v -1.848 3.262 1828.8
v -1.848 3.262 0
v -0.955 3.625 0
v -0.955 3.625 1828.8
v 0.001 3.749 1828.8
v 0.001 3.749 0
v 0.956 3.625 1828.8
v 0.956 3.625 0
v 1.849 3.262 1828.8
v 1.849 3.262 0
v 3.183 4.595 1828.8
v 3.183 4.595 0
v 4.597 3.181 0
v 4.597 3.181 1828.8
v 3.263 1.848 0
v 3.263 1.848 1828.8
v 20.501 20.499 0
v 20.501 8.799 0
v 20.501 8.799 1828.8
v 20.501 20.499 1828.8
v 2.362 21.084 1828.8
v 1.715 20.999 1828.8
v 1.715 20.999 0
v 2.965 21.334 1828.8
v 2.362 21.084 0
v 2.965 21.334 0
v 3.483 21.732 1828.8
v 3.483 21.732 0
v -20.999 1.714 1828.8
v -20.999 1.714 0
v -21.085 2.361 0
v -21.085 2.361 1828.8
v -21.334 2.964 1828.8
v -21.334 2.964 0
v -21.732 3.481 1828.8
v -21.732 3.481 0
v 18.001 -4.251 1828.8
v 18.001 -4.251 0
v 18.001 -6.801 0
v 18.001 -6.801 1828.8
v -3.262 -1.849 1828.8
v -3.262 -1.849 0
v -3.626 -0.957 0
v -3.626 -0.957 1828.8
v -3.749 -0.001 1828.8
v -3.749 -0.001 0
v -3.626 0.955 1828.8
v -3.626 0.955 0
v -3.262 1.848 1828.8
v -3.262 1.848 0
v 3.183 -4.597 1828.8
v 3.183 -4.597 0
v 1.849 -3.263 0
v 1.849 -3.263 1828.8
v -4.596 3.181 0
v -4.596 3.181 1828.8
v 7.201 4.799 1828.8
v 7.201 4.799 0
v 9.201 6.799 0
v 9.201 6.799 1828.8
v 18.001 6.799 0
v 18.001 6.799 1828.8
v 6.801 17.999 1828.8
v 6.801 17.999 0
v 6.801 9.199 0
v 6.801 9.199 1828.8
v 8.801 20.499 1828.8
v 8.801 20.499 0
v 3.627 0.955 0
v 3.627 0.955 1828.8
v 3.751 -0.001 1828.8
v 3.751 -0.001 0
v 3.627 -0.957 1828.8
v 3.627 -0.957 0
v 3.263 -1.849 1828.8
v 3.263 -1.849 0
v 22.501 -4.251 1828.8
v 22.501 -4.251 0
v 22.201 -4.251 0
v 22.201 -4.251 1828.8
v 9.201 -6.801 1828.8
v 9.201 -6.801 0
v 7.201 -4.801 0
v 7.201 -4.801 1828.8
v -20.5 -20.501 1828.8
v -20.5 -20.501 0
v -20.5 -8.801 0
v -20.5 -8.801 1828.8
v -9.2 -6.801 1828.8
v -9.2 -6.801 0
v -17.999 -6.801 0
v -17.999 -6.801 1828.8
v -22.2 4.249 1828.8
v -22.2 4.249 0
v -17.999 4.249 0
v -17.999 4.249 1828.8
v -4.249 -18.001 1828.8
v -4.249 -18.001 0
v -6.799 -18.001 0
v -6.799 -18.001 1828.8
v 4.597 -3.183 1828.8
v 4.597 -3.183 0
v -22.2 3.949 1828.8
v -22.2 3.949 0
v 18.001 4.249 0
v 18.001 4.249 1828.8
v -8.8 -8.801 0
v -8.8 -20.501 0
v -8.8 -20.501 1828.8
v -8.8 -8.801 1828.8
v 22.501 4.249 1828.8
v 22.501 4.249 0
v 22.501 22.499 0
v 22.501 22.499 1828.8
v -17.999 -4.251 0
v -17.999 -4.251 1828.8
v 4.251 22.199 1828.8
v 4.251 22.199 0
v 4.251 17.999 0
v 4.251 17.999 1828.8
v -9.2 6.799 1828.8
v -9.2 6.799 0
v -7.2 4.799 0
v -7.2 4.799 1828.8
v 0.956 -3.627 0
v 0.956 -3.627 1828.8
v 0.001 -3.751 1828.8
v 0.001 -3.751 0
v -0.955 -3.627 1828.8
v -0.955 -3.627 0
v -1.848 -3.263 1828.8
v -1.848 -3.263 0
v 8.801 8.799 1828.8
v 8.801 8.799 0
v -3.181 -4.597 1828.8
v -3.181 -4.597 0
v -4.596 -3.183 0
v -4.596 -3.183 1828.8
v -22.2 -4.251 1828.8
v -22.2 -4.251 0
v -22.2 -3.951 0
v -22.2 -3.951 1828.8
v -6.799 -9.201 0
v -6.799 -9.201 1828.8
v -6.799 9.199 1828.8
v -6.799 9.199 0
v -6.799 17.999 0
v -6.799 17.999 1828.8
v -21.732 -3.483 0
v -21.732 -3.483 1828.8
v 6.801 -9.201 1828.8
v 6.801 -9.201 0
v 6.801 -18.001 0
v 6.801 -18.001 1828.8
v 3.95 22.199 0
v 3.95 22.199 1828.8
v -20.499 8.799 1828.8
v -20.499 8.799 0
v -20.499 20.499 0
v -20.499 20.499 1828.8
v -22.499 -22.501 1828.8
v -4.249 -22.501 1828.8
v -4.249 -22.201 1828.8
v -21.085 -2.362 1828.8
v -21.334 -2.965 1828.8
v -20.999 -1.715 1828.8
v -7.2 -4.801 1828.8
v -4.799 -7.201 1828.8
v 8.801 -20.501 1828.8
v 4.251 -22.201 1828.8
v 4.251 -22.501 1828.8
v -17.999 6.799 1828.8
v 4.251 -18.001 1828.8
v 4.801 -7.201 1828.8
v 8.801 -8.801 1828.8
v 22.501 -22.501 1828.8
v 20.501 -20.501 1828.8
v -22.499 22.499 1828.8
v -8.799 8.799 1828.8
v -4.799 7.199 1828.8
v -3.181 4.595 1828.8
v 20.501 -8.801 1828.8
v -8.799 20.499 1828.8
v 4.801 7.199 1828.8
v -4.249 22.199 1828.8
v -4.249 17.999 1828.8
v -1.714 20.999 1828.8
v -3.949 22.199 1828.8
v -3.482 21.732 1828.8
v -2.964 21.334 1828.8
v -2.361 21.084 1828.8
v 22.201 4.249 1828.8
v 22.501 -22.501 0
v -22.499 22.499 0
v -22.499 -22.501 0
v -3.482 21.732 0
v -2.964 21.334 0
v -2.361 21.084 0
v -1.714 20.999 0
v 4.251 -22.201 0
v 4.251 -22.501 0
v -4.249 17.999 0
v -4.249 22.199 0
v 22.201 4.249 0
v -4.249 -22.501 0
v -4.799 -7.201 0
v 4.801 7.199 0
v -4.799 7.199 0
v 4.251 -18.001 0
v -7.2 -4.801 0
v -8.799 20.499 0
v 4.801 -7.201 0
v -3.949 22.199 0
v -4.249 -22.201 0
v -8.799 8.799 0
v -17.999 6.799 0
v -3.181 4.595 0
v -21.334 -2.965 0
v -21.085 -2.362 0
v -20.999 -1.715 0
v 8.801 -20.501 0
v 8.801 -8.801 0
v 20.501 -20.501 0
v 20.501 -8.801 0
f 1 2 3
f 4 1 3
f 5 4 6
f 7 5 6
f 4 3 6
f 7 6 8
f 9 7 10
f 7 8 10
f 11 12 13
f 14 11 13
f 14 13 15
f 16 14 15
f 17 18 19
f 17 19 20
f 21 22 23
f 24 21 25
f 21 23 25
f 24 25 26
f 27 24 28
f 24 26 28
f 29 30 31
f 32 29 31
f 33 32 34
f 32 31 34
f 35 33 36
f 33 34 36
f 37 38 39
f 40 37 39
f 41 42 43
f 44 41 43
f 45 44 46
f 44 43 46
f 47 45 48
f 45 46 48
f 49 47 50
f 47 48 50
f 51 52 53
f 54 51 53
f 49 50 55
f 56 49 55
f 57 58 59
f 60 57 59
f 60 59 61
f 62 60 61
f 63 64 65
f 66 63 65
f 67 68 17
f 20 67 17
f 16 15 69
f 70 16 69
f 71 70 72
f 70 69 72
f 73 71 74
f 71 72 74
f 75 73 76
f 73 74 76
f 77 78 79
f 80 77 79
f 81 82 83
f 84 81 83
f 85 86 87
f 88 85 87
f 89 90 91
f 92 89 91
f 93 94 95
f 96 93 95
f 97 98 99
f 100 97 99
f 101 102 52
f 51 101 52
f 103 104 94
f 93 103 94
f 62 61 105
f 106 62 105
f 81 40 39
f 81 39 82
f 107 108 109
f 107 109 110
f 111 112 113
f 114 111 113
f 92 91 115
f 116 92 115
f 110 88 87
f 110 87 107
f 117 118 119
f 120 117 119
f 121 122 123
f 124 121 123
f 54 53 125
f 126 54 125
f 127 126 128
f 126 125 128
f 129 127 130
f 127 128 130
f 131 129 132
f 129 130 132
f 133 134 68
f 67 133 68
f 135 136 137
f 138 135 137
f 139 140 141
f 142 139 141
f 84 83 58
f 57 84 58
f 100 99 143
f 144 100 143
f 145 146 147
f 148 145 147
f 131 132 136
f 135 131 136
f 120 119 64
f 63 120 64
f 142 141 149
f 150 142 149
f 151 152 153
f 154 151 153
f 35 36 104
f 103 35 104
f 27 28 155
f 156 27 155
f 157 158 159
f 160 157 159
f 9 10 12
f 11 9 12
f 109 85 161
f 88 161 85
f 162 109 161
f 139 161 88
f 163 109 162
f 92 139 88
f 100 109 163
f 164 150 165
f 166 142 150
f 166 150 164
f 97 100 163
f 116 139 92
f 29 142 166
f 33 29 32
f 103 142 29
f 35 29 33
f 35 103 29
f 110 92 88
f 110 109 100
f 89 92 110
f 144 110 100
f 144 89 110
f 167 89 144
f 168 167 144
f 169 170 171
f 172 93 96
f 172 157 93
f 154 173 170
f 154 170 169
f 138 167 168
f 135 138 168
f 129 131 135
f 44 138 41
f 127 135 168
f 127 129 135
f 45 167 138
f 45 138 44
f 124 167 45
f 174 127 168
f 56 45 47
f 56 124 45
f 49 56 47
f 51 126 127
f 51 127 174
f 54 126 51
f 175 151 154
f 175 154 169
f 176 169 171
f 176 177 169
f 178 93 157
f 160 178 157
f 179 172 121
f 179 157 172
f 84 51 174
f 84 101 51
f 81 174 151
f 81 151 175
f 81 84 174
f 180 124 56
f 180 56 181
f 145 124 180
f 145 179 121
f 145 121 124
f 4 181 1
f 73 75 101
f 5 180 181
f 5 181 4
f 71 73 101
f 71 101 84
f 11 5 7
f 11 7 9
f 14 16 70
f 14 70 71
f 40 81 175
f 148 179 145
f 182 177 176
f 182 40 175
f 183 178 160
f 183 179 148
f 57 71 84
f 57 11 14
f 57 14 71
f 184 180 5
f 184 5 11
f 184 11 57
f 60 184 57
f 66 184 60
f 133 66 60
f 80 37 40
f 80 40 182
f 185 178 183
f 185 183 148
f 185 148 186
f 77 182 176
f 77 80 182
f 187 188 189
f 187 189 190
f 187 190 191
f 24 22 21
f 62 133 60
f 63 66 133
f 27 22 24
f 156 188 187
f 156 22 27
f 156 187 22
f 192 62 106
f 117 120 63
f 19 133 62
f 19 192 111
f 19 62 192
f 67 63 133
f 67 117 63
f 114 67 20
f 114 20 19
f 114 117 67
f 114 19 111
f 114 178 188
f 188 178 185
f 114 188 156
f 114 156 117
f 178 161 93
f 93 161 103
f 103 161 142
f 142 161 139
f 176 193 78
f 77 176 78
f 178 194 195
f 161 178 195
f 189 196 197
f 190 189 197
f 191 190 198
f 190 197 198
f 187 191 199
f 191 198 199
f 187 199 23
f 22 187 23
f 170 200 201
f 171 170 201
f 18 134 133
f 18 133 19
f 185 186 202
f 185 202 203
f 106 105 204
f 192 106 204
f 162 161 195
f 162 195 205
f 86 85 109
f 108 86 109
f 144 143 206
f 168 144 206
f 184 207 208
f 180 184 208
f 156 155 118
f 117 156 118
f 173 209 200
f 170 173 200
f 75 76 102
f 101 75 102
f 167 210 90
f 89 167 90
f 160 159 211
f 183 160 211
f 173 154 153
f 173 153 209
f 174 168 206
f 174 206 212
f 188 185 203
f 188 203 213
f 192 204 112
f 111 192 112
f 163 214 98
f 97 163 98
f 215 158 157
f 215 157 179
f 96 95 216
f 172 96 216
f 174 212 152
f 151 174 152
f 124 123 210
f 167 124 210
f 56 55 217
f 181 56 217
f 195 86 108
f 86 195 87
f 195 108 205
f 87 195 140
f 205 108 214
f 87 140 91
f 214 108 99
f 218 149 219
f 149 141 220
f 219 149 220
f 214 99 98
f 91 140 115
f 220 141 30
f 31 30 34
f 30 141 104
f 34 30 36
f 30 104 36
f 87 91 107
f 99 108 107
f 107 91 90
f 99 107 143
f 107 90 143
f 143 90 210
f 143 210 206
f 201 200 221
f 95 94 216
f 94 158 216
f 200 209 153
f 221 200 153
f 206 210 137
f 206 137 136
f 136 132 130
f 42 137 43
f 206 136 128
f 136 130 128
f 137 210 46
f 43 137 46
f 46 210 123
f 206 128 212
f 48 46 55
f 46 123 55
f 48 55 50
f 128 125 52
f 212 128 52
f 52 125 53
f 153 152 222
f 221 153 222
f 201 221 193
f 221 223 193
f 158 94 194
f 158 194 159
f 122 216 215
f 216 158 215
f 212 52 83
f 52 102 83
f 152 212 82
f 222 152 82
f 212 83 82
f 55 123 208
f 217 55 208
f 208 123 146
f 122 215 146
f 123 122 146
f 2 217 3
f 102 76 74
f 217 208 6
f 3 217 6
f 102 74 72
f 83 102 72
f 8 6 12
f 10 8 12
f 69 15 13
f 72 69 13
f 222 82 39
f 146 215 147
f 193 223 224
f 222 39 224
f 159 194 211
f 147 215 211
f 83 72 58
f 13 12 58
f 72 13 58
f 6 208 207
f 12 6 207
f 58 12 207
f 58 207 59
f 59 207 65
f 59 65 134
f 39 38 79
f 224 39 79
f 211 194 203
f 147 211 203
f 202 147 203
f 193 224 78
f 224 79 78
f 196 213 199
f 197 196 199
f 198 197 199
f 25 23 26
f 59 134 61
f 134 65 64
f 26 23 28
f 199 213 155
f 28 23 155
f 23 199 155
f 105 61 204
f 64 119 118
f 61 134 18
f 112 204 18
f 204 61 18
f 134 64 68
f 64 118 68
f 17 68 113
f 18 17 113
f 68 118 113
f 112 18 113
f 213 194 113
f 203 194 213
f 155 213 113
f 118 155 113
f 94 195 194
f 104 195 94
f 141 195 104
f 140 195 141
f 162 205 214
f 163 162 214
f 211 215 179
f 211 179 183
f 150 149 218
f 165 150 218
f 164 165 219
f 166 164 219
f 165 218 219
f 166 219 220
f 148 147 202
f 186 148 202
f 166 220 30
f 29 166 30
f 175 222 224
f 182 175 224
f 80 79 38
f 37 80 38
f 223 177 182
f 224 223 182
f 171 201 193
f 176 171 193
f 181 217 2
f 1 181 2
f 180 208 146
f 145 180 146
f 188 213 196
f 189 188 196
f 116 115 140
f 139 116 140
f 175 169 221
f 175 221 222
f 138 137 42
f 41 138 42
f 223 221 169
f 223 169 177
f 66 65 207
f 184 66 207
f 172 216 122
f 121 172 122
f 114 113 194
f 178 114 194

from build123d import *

# Parameters (mm, degrees)
SKETCH1_W           = 11.699975178
SKETCH1_H           = 11.699996949
SKETCH1_W_2         = 11.699990436
SKETCH1_H_2         = 11.699981689
SKETCH1_W_3         = 11.699990437
SKETCH1_H_3         = 11.699975177
SKETCH1_W_4         = 11.699981689
SKETCH1_H_4         = 11.699990436
BOSS_EXTRUDE1_DEPTH = 1828.8


with BuildPart() as part:
    # Sketch1 → Boss-Extrude1 (new body)
    with BuildSketch(Plane.XY):
        Polygon((22.500515052, 22.499297556), (-22.499484399, 22.499298105), (-22.499484948, -22.500701346), (-4.249491942, -22.500701568), (-4.249491942, -22.200733242), (-4.24949208, -18.000719999), (-6.799479919, -18.000719999), (-6.799480207, -9.200732353), (-4.799480391, -7.200732362), (4.800525817, -7.200732047), (6.8005258, -9.200731855), (6.800526088, -18.000720263), (4.250507877, -18.000720263), (4.250508015, -22.200733153), (4.250508015, -22.500701672), (22.500514502, -22.500701895), (22.500514725, -4.250714302), (22.200520351, -4.250714302), (18.000507108, -4.25071444), (18.000507108, -6.800702279), (9.200519462, -6.800702567), (7.200519471, -4.800702751), (7.200519156, 4.799303458), (9.200518964, 6.79930344), (18.000507424, 6.799303729), (18.000507424, 4.249285514), (22.200520261, 4.249285652), (22.500514829, 4.249285652), align=None)
        with BuildLine():
            Line((-4.249491247, 17.999291576), (-4.249490956, 22.199304807))
            Line((-4.249490956, 22.199304807), (-3.949472548, 22.199304807))
            Line((-3.949472548, 22.199304807), (-3.481695222, 21.73152644))
            ThreePointArc((-3.481695222, 21.73152644), (-2.670636178, 21.189593132), (-1.713926324, 20.999291428))
            Line((-1.713926324, 20.999291428), (1.714975167, 20.999291428))
            ThreePointArc((1.714975167, 20.999291428), (2.671722509, 21.189608628), (3.482801459, 21.731583767))
            Line((3.482801459, 21.731583767), (3.950490798, 22.199304487))
            Line((3.950490798, 22.199304487), (4.250509108, 22.199304487))
            Line((4.250509108, 22.199304487), (4.250508817, 17.999291575))
            Line((4.250508817, 17.999291575), (6.800527063, 17.999291575))
            Line((6.800527063, 17.999291575), (6.800526453, 9.199302988))
            Line((6.800526453, 9.199302988), (4.800526064, 7.199302969))
            Line((4.800526064, 7.199302969), (-4.799479817, 7.199303635))
            Line((-4.799479817, 7.199303635), (-6.799479854, 9.199304042))
            Line((-6.799479854, 9.199304042), (-6.799479244, 17.999291576))
            Line((-6.799479244, 17.999291576), (-4.249491247, 17.999291576))
        make_face(mode=Mode.SUBTRACT)
        with BuildLine():
            Line((-22.199510888, 4.249285566), (-17.999497356, 4.249285704))
            Line((-17.999497356, 4.249285704), (-17.999497356, 6.79927354))
            Line((-17.999497356, 6.79927354), (-9.199509947, 6.799273828))
            Line((-9.199509947, 6.799273828), (-7.199509956, 4.799274012))
            Line((-7.199509956, 4.799274012), (-7.199509641, -4.800732197))
            Line((-7.199509641, -4.800732197), (-9.199509449, -6.800732179))
            Line((-9.199509449, -6.800732179), (-17.99949762, -6.800732468))
            Line((-17.99949762, -6.800732468), (-17.99949762, -4.250714253))
            Line((-17.99949762, -4.250714253), (-22.199510799, -4.250714391))
            Line((-22.199510799, -4.250714391), (-22.199510799, -3.950696126))
            Line((-22.199510799, -3.950696126), (-21.731790056, -3.48300681))
            ThreePointArc((-21.731790056, -3.48300681), (-21.189814855, -2.671927844), (-20.999497617, -1.71518046))
            Line((-20.999497617, -1.71518046), (-20.999497617, 1.713721031))
            ThreePointArc((-20.999497617, 1.713721031), (-21.189799286, 2.670430863), (-21.731732544, 3.481489907))
            Line((-21.731732544, 3.481489907), (-22.199510888, 3.949267256))
            Line((-22.199510888, 3.949267256), (-22.199510888, 4.249285566))
        make_face(mode=Mode.SUBTRACT)
        with Locations((-14.649542346, -14.650709384)):
            Rectangle(SKETCH1_W, SKETCH1_H, mode=Mode.SUBTRACT)
        with Locations((14.65050626, -14.650767962)):
            Rectangle(SKETCH1_W_2, SKETCH1_H_2, mode=Mode.SUBTRACT)
        with BuildLine():
            Line((-3.181457266, -4.596908447), (-4.595670829, -3.182694885))
            Line((-4.595670829, -3.182694885), (-3.26221457, -1.849238626))
            ThreePointArc((-3.26221457, -1.849238626), (-3.749476751, -0.00071437), (-3.26221457, 1.847809887))
            Line((-3.26221457, 1.847809887), (-4.595670829, 3.181266146))
            Line((-4.595670829, 3.181266146), (-3.181457266, 4.595479708))
            Line((-3.181457266, 4.595479708), (-1.848001007, 3.262023449))
            ThreePointArc((-1.848001007, 3.262023449), (0.000523249, 3.74928563), (1.849047505, 3.262023449))
            Line((1.849047505, 3.262023449), (3.182503764, 4.595479708))
            Line((3.182503764, 4.595479708), (4.596717327, 3.181266146))
            Line((4.596717327, 3.181266146), (3.263261068, 1.847809887))
            ThreePointArc((3.263261068, 1.847809887), (3.750523249, -0.00071437), (3.263261068, -1.849238626))
            Line((3.263261068, -1.849238626), (4.596717327, -3.182694885))
            Line((4.596717327, -3.182694885), (3.182503764, -4.596908447))
            Line((3.182503764, -4.596908447), (1.849047505, -3.263452188))
            ThreePointArc((1.849047505, -3.263452188), (0.000523249, -3.75071437), (-1.848001007, -3.263452188))
            Line((-1.848001007, -3.263452188), (-3.181457266, -4.596908447))
        make_face(mode=Mode.SUBTRACT)
        with Locations((-14.64949028, 14.649335967)):
            Rectangle(SKETCH1_W_3, SKETCH1_H_3, mode=Mode.SUBTRACT)
        with Locations((14.650561583, 14.6492839)):
            Rectangle(SKETCH1_W_4, SKETCH1_H_4, mode=Mode.SUBTRACT)
    extrude(amount=BOSS_EXTRUDE1_DEPTH)


solid = part.part
